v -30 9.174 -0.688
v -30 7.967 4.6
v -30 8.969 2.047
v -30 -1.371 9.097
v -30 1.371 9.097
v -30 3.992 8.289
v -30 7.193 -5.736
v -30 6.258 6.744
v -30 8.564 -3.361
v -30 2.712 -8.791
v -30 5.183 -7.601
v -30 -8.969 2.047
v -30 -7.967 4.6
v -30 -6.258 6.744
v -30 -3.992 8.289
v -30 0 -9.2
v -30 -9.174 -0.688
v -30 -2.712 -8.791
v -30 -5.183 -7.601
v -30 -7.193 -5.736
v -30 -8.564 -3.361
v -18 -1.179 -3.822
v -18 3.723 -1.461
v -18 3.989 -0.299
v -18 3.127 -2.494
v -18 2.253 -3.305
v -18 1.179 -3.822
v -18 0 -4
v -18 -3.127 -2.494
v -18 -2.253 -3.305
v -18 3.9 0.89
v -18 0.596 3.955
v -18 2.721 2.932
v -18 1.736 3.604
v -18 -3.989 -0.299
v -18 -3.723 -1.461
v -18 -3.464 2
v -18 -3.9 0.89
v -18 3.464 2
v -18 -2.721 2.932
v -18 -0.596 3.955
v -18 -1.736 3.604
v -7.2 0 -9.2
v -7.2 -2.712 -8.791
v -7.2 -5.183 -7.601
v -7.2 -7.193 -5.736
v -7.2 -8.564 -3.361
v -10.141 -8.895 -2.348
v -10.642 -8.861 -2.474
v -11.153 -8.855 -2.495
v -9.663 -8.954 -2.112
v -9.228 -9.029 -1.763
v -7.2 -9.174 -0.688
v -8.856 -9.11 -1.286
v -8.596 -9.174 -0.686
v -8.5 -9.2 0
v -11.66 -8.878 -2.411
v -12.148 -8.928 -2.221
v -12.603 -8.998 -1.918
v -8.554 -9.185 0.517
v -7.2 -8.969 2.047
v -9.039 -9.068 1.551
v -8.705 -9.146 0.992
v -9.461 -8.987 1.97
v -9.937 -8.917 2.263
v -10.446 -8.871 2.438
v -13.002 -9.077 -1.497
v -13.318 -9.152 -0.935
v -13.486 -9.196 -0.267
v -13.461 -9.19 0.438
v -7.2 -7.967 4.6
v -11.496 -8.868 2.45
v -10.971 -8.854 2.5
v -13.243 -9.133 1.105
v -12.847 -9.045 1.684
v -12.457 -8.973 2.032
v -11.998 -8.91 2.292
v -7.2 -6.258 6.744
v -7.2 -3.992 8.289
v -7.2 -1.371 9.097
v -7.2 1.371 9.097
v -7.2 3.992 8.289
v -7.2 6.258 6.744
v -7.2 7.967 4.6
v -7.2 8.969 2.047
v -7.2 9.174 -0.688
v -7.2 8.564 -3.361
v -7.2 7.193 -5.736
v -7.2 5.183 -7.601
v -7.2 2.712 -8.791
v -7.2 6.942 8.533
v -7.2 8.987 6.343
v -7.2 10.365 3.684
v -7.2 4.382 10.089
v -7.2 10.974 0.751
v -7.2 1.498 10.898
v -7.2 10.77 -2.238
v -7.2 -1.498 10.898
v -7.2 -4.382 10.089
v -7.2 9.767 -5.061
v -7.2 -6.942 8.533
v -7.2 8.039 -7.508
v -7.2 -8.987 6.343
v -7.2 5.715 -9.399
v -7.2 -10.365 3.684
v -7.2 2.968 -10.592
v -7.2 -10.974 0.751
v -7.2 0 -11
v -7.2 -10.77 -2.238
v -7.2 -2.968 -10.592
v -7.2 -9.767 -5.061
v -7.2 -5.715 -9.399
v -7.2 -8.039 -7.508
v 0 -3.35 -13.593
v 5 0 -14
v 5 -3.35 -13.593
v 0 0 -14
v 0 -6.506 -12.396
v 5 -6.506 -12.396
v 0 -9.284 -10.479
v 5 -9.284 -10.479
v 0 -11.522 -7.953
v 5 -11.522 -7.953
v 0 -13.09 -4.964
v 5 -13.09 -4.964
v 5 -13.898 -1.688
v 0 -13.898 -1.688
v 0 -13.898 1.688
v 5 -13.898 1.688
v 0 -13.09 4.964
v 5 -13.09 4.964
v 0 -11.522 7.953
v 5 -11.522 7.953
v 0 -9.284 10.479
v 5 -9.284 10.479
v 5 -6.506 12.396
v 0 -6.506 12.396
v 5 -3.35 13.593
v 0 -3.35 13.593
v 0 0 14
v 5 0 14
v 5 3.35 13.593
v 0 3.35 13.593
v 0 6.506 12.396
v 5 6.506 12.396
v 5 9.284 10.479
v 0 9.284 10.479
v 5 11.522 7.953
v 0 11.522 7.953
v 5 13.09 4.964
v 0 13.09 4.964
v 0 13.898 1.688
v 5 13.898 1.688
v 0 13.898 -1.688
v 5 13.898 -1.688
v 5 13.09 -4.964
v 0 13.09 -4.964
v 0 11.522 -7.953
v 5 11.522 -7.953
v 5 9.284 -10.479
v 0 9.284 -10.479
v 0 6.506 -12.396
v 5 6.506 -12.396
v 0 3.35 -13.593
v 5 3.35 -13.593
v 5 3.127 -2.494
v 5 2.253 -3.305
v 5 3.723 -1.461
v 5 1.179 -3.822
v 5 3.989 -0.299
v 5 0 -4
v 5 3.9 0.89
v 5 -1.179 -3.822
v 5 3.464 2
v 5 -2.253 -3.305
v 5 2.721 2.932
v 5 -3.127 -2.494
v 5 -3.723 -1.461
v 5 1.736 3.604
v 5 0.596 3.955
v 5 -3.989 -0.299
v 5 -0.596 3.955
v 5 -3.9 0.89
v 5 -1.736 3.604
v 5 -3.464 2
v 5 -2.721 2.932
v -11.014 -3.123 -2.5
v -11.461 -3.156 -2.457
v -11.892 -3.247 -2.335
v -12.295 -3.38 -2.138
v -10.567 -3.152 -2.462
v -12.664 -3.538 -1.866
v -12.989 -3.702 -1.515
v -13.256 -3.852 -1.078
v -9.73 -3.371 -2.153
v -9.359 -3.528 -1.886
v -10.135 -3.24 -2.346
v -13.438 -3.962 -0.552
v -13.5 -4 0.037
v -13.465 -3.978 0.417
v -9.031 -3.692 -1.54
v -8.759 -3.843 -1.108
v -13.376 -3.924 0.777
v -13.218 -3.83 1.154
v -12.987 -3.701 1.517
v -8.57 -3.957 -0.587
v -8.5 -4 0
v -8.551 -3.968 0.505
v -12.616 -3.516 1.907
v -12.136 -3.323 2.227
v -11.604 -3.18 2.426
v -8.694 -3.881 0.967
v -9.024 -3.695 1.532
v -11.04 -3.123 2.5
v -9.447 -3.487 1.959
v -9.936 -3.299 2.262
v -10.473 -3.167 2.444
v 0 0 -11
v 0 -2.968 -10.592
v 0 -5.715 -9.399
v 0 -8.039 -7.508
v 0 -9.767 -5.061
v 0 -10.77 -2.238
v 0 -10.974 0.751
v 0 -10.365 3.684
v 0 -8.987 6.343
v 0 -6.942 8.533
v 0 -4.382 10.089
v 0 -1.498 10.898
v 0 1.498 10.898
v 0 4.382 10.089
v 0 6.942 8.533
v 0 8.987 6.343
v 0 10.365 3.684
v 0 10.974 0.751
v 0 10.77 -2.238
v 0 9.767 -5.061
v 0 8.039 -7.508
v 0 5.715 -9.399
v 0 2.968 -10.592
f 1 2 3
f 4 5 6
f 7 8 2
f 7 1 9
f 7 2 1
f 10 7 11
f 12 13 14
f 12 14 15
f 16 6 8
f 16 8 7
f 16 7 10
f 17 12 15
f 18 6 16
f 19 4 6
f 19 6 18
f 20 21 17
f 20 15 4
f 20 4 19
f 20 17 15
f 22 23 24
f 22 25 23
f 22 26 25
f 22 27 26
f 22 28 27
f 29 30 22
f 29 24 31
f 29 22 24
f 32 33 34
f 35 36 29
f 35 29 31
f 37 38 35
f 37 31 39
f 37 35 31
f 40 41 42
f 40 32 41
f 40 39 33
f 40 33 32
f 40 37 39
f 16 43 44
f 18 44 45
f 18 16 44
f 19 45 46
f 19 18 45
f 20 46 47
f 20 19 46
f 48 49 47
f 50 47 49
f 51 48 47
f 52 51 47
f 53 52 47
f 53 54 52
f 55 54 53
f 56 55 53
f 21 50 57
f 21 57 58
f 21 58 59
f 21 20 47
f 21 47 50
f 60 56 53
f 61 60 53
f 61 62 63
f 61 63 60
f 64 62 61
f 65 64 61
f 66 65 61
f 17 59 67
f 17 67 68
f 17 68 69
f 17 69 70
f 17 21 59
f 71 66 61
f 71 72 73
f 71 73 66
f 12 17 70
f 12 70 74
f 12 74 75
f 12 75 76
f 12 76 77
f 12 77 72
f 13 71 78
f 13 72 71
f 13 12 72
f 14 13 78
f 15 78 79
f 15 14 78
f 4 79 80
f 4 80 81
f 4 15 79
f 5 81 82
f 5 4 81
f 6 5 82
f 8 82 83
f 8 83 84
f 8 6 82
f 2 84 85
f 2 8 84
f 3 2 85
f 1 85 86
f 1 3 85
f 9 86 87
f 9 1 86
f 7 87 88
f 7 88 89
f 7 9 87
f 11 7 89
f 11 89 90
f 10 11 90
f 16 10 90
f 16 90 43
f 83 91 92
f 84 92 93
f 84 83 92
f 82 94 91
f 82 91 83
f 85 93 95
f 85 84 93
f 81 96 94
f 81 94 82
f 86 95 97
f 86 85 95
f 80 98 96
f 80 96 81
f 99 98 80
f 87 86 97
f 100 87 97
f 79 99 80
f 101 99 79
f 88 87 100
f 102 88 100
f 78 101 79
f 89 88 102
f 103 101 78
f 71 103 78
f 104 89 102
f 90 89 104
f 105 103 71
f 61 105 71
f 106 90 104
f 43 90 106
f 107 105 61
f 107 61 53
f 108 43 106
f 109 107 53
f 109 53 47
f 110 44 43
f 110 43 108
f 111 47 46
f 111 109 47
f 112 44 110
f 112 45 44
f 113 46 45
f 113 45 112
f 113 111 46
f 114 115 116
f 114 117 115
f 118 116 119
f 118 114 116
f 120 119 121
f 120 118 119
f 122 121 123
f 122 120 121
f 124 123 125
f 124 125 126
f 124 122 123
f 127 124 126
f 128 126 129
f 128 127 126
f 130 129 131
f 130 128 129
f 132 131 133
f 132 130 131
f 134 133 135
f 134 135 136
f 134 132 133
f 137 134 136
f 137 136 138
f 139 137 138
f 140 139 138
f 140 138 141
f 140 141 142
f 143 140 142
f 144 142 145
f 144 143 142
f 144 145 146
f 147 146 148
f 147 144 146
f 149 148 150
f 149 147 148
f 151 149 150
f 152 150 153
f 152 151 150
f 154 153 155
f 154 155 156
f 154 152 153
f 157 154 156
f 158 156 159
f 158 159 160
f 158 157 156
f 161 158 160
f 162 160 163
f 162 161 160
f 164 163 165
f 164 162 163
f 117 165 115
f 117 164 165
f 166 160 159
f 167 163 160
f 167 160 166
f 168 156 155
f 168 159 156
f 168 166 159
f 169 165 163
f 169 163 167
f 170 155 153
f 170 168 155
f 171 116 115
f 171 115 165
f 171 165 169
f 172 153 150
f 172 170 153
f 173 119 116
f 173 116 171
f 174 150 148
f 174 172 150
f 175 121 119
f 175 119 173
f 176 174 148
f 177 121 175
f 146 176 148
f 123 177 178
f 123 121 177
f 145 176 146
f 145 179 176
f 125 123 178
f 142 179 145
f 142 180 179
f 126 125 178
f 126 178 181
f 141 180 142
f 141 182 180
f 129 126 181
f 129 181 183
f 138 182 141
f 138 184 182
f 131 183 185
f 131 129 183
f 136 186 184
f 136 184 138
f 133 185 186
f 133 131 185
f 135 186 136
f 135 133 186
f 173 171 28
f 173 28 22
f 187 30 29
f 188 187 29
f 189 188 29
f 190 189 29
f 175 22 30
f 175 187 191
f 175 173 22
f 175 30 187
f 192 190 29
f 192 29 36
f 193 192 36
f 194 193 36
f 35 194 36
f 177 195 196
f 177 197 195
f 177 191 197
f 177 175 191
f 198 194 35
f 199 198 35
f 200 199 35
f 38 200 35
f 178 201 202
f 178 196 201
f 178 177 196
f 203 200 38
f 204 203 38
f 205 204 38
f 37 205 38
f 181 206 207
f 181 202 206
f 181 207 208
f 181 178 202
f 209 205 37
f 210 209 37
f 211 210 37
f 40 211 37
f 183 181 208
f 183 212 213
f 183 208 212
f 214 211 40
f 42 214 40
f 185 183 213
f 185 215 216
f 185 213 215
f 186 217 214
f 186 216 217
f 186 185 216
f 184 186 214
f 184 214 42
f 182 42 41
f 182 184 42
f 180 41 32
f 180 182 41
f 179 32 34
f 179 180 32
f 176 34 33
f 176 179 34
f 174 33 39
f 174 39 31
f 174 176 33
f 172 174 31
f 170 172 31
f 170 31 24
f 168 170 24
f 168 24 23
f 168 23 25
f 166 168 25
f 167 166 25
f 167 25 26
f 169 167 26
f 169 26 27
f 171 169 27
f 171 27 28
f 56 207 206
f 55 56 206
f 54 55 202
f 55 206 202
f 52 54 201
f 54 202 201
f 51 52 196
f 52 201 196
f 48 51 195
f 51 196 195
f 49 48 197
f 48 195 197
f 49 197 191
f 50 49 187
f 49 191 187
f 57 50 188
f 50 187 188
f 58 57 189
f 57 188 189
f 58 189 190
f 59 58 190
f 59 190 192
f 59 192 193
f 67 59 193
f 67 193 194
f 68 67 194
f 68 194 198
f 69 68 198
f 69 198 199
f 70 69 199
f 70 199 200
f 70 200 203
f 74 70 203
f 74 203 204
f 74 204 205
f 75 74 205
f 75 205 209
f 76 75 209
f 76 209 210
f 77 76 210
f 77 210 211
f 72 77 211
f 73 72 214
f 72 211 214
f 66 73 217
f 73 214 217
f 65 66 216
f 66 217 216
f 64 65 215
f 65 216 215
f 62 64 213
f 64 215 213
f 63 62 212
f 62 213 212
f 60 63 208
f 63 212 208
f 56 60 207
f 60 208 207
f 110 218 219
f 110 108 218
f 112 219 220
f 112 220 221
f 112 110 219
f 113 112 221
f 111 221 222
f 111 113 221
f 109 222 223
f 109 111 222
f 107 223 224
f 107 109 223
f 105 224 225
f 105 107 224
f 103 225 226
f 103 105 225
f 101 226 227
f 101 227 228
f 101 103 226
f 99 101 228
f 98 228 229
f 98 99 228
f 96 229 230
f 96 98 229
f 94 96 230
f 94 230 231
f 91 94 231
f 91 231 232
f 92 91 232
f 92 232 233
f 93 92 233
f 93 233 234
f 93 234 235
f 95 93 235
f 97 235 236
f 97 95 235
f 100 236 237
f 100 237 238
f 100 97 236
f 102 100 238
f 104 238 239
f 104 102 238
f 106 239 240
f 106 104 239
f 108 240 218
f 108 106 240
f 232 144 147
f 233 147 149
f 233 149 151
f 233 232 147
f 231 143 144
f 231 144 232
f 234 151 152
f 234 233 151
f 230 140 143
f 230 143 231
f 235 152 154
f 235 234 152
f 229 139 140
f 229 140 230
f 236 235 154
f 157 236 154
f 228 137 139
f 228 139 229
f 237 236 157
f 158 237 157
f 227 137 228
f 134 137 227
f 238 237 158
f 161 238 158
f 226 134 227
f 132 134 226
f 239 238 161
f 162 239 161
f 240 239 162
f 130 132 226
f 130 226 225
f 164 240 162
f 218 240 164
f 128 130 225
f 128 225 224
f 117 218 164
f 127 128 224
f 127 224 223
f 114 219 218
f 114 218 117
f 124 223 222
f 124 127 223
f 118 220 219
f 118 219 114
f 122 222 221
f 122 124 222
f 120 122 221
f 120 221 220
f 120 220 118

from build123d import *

# Parameters (mm, degrees)
SKETCH3_R          = 2.5
CUT_EXTRUDE1_DEPTH = 10


with BuildPart() as part:
    # Sketch1 → Revolve1 (revolve)
    with BuildSketch(Plane(origin=(0, 0, 0), x_dir=(1, 0, 0), z_dir=(0, 1, 0))):
        Polygon((0, 11), (-7.2, 11), (-7.2, 9.2), (-30, 9.2), (-30, 0), (-18, 0), (-18, 4), (0, 4), (5, 4), (5, 14), (0, 14), align=None)
    revolve(axis=Axis((-18, 0, 0), (-1, 0, 0)))

    # Sketch3 → Cut-Extrude1 (cut)
    with BuildSketch(Plane(origin=(0, 0, 0), x_dir=(1, 0, 0), z_dir=(0, 1, 0))):
        with Locations((-11, 0)):
            Circle(SKETCH3_R)
    extrude(amount=-CUT_EXTRUDE1_DEPTH, mode=Mode.SUBTRACT)


solid = part.part
